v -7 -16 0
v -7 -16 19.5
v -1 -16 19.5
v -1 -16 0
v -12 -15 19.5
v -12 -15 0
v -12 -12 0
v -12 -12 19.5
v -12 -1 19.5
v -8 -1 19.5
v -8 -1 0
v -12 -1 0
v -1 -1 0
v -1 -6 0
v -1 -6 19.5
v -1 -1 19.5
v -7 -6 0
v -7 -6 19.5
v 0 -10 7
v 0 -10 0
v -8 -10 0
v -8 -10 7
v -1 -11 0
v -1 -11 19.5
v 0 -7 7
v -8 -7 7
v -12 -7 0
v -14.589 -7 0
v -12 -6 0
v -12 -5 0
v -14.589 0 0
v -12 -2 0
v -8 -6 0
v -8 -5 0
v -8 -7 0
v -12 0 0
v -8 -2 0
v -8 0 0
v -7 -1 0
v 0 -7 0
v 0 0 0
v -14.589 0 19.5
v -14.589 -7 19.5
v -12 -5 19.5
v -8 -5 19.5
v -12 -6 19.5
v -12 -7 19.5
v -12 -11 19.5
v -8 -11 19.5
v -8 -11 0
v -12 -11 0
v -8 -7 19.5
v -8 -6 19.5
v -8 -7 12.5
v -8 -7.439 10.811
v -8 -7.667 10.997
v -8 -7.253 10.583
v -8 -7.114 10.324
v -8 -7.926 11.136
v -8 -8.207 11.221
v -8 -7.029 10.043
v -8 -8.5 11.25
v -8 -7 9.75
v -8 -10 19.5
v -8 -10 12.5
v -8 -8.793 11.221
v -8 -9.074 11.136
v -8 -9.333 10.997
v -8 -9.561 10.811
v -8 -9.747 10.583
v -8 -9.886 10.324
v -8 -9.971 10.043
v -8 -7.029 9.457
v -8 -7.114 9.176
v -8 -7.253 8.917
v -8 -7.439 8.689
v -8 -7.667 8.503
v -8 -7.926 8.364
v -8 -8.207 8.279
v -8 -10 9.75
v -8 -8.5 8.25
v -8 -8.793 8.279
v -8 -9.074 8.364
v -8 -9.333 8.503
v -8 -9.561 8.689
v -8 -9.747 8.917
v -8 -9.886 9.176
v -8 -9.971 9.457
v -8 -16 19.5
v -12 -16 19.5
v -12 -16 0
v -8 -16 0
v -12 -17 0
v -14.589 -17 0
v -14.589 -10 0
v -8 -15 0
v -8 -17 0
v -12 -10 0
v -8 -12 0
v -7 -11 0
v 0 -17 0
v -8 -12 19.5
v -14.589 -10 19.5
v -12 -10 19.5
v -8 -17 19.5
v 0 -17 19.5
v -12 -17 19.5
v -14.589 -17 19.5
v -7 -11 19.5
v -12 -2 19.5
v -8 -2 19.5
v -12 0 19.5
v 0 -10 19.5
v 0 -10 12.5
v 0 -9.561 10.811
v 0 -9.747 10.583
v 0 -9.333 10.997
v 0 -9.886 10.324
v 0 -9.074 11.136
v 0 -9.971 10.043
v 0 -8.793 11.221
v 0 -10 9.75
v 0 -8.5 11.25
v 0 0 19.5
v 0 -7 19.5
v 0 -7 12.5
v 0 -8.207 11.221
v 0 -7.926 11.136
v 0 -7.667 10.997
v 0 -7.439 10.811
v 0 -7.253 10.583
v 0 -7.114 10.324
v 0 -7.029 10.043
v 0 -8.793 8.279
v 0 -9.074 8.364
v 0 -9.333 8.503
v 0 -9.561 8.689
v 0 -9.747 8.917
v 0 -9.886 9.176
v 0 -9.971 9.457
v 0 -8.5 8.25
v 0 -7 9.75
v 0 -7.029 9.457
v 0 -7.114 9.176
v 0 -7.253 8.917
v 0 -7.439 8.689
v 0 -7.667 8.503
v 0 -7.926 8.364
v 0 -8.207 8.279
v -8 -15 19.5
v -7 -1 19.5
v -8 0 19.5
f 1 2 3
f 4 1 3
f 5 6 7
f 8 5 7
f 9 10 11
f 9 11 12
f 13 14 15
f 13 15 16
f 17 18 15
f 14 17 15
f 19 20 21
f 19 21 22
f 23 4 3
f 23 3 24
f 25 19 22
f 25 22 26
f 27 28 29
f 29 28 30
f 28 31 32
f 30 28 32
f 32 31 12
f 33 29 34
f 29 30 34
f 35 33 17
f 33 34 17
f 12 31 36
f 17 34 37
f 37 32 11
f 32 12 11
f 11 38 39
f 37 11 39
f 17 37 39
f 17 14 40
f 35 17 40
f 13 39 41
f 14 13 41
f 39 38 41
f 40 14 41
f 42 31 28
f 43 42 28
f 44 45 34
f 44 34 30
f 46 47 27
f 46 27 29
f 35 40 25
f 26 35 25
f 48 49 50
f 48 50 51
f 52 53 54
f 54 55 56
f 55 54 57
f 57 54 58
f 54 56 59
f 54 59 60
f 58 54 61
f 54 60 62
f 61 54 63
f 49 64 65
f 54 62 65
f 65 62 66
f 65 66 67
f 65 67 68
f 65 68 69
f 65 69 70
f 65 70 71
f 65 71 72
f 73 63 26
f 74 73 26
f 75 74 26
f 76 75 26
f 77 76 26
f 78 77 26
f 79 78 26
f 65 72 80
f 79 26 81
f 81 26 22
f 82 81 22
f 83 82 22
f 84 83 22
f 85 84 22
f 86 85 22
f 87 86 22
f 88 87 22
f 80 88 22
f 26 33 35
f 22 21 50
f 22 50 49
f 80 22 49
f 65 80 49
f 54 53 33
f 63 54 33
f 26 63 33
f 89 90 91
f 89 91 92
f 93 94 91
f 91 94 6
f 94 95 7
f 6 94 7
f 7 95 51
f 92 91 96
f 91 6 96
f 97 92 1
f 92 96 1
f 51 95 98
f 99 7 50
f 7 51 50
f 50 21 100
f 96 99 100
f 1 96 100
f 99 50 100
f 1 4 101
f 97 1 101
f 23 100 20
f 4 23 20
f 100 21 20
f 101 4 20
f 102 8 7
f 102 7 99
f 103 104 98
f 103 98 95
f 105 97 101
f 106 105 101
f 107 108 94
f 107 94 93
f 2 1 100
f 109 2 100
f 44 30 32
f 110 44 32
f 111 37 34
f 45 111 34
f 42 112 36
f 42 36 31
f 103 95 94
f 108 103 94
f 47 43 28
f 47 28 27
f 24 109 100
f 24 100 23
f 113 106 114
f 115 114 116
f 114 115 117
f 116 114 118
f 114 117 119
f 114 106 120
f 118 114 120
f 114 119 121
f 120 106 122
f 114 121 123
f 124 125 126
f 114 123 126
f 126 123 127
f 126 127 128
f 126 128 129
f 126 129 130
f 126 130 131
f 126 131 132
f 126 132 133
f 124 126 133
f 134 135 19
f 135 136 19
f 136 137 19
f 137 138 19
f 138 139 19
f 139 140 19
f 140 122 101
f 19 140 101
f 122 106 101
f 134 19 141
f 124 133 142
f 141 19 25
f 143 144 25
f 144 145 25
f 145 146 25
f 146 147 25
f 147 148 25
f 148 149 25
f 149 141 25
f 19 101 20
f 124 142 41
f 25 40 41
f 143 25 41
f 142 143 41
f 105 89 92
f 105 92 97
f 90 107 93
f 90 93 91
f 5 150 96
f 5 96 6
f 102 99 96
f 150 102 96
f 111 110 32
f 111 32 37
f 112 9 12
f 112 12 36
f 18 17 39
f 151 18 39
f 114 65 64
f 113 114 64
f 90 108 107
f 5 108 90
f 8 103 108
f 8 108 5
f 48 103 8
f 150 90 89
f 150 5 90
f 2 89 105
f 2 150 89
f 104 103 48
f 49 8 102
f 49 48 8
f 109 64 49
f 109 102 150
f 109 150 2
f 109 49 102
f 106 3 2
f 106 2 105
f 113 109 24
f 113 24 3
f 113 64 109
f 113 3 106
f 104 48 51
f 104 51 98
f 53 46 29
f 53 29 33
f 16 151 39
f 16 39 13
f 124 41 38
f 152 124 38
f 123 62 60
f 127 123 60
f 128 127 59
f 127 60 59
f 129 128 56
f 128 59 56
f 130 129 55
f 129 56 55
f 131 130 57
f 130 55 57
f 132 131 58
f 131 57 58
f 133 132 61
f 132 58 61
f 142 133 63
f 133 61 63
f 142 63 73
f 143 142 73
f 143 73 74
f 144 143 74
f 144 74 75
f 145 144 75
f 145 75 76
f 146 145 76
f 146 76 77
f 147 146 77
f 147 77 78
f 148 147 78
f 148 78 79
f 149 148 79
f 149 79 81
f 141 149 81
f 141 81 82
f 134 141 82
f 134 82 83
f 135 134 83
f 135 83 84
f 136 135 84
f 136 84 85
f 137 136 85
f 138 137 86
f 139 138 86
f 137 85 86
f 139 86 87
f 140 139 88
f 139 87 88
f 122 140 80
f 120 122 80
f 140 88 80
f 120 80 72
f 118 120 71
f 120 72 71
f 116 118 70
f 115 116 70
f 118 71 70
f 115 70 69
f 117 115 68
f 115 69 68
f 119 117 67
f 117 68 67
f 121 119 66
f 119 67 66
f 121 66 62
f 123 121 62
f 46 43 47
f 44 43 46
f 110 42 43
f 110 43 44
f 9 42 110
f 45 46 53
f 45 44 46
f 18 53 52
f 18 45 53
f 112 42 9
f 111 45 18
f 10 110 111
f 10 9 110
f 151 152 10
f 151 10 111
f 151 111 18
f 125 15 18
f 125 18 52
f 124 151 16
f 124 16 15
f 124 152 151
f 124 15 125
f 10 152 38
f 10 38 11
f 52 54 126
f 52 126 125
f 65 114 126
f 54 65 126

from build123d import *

# Parameters (mm, degrees)
CROQUIS2_W              = 6
CROQUIS2_H              = 5
SALIENTE_EXTRUIR1_DEPTH = 19.5
CORTAR_EXTRUIR1_REACH   = 29.079
CROQUIS4_R              = 1.5
CROQUIS4_W              = 7
CROQUIS4_H              = 3


with BuildPart() as part:
    # Croquis2 → Saliente-Extruir1 (new body)
    # profile 1 of 2: a face of its own
    with BuildSketch(Plane.XY):
        Polygon((0, -7), (0, 0), (-8, 0), (-8, -1), (-12, -1), (-12, 0), (-14.589269471, 0), (-14.589269471, -7), (-12, -7), (-12, -6), (-8, -6), (-8, -7), (-8, -8.5), (0, -8.5), align=None)
        Polygon((-8, -2), (-8, -3.5), (-8, -5), (-12, -5), (-12, -2), align=None, mode=Mode.SUBTRACT)
        with Locations((-4, -3.5)):
            Rectangle(CROQUIS2_W, CROQUIS2_H, mode=Mode.SUBTRACT)
    # profile 2 of 2: a face of its own
    with BuildSketch(Plane.XY):
        Polygon((0, -10), (0, -8.5), (-8, -8.5), (-8, -10), (-8, -11), (-12, -11), (-12, -10), (-14.589269471, -10), (-14.589269471, -17), (-12, -17), (-12, -16), (-8, -16), (-8, -17), (0, -17), align=None)
        Polygon((-12, -12), (-8, -12), (-8, -13.5), (-8, -15), (-12, -15), align=None, mode=Mode.SUBTRACT)
        with Locations((-4, -13.5)):
            Rectangle(CROQUIS2_W, CROQUIS2_H, mode=Mode.SUBTRACT)
    extrude(amount=SALIENTE_EXTRUIR1_DEPTH)

    # Croquis4 → Cortar-Extruir1 (cut, up to next)
    with BuildSketch(Plane.ZY.offset(8), mode=Mode.PRIVATE) as cortar_extruir1_sk1:
        with Locations((9.75, -8.5)):
            Circle(CROQUIS4_R)
    cortar_extruir1_tool1 = extrude(cortar_extruir1_sk1.sketch, amount=-CORTAR_EXTRUIR1_REACH, mode=Mode.PRIVATE) & part.part
    # Croquis4 → Cortar-Extruir1 (cut, up to next)
    with BuildSketch(Plane.ZY.offset(8), mode=Mode.PRIVATE) as cortar_extruir1_sk2:
        with Locations((3.5, -8.5)):
            Rectangle(CROQUIS4_W, CROQUIS4_H)
    cortar_extruir1_tool2 = extrude(cortar_extruir1_sk2.sketch, amount=-CORTAR_EXTRUIR1_REACH, mode=Mode.PRIVATE) & part.part
    # Croquis4 → Cortar-Extruir1 (cut, up to next)
    with BuildSketch(Plane.ZY.offset(8), mode=Mode.PRIVATE) as cortar_extruir1_sk3:
        with Locations((16, -8.5)):
            Rectangle(CROQUIS4_W, CROQUIS4_H)
    cortar_extruir1_tool3 = extrude(cortar_extruir1_sk3.sketch, amount=-CORTAR_EXTRUIR1_REACH, mode=Mode.PRIVATE) & part.part
    add(cortar_extruir1_tool1.solids().sort_by_distance((-8, -8.5, 9.75))[0], mode=Mode.SUBTRACT)
    add(cortar_extruir1_tool2.solids().sort_by_distance((-8, -8.5, 3.5))[0], mode=Mode.SUBTRACT)
    add(cortar_extruir1_tool3.solids().sort_by_distance((-8, -8.5, 16))[0], mode=Mode.SUBTRACT)


solid = part.part
